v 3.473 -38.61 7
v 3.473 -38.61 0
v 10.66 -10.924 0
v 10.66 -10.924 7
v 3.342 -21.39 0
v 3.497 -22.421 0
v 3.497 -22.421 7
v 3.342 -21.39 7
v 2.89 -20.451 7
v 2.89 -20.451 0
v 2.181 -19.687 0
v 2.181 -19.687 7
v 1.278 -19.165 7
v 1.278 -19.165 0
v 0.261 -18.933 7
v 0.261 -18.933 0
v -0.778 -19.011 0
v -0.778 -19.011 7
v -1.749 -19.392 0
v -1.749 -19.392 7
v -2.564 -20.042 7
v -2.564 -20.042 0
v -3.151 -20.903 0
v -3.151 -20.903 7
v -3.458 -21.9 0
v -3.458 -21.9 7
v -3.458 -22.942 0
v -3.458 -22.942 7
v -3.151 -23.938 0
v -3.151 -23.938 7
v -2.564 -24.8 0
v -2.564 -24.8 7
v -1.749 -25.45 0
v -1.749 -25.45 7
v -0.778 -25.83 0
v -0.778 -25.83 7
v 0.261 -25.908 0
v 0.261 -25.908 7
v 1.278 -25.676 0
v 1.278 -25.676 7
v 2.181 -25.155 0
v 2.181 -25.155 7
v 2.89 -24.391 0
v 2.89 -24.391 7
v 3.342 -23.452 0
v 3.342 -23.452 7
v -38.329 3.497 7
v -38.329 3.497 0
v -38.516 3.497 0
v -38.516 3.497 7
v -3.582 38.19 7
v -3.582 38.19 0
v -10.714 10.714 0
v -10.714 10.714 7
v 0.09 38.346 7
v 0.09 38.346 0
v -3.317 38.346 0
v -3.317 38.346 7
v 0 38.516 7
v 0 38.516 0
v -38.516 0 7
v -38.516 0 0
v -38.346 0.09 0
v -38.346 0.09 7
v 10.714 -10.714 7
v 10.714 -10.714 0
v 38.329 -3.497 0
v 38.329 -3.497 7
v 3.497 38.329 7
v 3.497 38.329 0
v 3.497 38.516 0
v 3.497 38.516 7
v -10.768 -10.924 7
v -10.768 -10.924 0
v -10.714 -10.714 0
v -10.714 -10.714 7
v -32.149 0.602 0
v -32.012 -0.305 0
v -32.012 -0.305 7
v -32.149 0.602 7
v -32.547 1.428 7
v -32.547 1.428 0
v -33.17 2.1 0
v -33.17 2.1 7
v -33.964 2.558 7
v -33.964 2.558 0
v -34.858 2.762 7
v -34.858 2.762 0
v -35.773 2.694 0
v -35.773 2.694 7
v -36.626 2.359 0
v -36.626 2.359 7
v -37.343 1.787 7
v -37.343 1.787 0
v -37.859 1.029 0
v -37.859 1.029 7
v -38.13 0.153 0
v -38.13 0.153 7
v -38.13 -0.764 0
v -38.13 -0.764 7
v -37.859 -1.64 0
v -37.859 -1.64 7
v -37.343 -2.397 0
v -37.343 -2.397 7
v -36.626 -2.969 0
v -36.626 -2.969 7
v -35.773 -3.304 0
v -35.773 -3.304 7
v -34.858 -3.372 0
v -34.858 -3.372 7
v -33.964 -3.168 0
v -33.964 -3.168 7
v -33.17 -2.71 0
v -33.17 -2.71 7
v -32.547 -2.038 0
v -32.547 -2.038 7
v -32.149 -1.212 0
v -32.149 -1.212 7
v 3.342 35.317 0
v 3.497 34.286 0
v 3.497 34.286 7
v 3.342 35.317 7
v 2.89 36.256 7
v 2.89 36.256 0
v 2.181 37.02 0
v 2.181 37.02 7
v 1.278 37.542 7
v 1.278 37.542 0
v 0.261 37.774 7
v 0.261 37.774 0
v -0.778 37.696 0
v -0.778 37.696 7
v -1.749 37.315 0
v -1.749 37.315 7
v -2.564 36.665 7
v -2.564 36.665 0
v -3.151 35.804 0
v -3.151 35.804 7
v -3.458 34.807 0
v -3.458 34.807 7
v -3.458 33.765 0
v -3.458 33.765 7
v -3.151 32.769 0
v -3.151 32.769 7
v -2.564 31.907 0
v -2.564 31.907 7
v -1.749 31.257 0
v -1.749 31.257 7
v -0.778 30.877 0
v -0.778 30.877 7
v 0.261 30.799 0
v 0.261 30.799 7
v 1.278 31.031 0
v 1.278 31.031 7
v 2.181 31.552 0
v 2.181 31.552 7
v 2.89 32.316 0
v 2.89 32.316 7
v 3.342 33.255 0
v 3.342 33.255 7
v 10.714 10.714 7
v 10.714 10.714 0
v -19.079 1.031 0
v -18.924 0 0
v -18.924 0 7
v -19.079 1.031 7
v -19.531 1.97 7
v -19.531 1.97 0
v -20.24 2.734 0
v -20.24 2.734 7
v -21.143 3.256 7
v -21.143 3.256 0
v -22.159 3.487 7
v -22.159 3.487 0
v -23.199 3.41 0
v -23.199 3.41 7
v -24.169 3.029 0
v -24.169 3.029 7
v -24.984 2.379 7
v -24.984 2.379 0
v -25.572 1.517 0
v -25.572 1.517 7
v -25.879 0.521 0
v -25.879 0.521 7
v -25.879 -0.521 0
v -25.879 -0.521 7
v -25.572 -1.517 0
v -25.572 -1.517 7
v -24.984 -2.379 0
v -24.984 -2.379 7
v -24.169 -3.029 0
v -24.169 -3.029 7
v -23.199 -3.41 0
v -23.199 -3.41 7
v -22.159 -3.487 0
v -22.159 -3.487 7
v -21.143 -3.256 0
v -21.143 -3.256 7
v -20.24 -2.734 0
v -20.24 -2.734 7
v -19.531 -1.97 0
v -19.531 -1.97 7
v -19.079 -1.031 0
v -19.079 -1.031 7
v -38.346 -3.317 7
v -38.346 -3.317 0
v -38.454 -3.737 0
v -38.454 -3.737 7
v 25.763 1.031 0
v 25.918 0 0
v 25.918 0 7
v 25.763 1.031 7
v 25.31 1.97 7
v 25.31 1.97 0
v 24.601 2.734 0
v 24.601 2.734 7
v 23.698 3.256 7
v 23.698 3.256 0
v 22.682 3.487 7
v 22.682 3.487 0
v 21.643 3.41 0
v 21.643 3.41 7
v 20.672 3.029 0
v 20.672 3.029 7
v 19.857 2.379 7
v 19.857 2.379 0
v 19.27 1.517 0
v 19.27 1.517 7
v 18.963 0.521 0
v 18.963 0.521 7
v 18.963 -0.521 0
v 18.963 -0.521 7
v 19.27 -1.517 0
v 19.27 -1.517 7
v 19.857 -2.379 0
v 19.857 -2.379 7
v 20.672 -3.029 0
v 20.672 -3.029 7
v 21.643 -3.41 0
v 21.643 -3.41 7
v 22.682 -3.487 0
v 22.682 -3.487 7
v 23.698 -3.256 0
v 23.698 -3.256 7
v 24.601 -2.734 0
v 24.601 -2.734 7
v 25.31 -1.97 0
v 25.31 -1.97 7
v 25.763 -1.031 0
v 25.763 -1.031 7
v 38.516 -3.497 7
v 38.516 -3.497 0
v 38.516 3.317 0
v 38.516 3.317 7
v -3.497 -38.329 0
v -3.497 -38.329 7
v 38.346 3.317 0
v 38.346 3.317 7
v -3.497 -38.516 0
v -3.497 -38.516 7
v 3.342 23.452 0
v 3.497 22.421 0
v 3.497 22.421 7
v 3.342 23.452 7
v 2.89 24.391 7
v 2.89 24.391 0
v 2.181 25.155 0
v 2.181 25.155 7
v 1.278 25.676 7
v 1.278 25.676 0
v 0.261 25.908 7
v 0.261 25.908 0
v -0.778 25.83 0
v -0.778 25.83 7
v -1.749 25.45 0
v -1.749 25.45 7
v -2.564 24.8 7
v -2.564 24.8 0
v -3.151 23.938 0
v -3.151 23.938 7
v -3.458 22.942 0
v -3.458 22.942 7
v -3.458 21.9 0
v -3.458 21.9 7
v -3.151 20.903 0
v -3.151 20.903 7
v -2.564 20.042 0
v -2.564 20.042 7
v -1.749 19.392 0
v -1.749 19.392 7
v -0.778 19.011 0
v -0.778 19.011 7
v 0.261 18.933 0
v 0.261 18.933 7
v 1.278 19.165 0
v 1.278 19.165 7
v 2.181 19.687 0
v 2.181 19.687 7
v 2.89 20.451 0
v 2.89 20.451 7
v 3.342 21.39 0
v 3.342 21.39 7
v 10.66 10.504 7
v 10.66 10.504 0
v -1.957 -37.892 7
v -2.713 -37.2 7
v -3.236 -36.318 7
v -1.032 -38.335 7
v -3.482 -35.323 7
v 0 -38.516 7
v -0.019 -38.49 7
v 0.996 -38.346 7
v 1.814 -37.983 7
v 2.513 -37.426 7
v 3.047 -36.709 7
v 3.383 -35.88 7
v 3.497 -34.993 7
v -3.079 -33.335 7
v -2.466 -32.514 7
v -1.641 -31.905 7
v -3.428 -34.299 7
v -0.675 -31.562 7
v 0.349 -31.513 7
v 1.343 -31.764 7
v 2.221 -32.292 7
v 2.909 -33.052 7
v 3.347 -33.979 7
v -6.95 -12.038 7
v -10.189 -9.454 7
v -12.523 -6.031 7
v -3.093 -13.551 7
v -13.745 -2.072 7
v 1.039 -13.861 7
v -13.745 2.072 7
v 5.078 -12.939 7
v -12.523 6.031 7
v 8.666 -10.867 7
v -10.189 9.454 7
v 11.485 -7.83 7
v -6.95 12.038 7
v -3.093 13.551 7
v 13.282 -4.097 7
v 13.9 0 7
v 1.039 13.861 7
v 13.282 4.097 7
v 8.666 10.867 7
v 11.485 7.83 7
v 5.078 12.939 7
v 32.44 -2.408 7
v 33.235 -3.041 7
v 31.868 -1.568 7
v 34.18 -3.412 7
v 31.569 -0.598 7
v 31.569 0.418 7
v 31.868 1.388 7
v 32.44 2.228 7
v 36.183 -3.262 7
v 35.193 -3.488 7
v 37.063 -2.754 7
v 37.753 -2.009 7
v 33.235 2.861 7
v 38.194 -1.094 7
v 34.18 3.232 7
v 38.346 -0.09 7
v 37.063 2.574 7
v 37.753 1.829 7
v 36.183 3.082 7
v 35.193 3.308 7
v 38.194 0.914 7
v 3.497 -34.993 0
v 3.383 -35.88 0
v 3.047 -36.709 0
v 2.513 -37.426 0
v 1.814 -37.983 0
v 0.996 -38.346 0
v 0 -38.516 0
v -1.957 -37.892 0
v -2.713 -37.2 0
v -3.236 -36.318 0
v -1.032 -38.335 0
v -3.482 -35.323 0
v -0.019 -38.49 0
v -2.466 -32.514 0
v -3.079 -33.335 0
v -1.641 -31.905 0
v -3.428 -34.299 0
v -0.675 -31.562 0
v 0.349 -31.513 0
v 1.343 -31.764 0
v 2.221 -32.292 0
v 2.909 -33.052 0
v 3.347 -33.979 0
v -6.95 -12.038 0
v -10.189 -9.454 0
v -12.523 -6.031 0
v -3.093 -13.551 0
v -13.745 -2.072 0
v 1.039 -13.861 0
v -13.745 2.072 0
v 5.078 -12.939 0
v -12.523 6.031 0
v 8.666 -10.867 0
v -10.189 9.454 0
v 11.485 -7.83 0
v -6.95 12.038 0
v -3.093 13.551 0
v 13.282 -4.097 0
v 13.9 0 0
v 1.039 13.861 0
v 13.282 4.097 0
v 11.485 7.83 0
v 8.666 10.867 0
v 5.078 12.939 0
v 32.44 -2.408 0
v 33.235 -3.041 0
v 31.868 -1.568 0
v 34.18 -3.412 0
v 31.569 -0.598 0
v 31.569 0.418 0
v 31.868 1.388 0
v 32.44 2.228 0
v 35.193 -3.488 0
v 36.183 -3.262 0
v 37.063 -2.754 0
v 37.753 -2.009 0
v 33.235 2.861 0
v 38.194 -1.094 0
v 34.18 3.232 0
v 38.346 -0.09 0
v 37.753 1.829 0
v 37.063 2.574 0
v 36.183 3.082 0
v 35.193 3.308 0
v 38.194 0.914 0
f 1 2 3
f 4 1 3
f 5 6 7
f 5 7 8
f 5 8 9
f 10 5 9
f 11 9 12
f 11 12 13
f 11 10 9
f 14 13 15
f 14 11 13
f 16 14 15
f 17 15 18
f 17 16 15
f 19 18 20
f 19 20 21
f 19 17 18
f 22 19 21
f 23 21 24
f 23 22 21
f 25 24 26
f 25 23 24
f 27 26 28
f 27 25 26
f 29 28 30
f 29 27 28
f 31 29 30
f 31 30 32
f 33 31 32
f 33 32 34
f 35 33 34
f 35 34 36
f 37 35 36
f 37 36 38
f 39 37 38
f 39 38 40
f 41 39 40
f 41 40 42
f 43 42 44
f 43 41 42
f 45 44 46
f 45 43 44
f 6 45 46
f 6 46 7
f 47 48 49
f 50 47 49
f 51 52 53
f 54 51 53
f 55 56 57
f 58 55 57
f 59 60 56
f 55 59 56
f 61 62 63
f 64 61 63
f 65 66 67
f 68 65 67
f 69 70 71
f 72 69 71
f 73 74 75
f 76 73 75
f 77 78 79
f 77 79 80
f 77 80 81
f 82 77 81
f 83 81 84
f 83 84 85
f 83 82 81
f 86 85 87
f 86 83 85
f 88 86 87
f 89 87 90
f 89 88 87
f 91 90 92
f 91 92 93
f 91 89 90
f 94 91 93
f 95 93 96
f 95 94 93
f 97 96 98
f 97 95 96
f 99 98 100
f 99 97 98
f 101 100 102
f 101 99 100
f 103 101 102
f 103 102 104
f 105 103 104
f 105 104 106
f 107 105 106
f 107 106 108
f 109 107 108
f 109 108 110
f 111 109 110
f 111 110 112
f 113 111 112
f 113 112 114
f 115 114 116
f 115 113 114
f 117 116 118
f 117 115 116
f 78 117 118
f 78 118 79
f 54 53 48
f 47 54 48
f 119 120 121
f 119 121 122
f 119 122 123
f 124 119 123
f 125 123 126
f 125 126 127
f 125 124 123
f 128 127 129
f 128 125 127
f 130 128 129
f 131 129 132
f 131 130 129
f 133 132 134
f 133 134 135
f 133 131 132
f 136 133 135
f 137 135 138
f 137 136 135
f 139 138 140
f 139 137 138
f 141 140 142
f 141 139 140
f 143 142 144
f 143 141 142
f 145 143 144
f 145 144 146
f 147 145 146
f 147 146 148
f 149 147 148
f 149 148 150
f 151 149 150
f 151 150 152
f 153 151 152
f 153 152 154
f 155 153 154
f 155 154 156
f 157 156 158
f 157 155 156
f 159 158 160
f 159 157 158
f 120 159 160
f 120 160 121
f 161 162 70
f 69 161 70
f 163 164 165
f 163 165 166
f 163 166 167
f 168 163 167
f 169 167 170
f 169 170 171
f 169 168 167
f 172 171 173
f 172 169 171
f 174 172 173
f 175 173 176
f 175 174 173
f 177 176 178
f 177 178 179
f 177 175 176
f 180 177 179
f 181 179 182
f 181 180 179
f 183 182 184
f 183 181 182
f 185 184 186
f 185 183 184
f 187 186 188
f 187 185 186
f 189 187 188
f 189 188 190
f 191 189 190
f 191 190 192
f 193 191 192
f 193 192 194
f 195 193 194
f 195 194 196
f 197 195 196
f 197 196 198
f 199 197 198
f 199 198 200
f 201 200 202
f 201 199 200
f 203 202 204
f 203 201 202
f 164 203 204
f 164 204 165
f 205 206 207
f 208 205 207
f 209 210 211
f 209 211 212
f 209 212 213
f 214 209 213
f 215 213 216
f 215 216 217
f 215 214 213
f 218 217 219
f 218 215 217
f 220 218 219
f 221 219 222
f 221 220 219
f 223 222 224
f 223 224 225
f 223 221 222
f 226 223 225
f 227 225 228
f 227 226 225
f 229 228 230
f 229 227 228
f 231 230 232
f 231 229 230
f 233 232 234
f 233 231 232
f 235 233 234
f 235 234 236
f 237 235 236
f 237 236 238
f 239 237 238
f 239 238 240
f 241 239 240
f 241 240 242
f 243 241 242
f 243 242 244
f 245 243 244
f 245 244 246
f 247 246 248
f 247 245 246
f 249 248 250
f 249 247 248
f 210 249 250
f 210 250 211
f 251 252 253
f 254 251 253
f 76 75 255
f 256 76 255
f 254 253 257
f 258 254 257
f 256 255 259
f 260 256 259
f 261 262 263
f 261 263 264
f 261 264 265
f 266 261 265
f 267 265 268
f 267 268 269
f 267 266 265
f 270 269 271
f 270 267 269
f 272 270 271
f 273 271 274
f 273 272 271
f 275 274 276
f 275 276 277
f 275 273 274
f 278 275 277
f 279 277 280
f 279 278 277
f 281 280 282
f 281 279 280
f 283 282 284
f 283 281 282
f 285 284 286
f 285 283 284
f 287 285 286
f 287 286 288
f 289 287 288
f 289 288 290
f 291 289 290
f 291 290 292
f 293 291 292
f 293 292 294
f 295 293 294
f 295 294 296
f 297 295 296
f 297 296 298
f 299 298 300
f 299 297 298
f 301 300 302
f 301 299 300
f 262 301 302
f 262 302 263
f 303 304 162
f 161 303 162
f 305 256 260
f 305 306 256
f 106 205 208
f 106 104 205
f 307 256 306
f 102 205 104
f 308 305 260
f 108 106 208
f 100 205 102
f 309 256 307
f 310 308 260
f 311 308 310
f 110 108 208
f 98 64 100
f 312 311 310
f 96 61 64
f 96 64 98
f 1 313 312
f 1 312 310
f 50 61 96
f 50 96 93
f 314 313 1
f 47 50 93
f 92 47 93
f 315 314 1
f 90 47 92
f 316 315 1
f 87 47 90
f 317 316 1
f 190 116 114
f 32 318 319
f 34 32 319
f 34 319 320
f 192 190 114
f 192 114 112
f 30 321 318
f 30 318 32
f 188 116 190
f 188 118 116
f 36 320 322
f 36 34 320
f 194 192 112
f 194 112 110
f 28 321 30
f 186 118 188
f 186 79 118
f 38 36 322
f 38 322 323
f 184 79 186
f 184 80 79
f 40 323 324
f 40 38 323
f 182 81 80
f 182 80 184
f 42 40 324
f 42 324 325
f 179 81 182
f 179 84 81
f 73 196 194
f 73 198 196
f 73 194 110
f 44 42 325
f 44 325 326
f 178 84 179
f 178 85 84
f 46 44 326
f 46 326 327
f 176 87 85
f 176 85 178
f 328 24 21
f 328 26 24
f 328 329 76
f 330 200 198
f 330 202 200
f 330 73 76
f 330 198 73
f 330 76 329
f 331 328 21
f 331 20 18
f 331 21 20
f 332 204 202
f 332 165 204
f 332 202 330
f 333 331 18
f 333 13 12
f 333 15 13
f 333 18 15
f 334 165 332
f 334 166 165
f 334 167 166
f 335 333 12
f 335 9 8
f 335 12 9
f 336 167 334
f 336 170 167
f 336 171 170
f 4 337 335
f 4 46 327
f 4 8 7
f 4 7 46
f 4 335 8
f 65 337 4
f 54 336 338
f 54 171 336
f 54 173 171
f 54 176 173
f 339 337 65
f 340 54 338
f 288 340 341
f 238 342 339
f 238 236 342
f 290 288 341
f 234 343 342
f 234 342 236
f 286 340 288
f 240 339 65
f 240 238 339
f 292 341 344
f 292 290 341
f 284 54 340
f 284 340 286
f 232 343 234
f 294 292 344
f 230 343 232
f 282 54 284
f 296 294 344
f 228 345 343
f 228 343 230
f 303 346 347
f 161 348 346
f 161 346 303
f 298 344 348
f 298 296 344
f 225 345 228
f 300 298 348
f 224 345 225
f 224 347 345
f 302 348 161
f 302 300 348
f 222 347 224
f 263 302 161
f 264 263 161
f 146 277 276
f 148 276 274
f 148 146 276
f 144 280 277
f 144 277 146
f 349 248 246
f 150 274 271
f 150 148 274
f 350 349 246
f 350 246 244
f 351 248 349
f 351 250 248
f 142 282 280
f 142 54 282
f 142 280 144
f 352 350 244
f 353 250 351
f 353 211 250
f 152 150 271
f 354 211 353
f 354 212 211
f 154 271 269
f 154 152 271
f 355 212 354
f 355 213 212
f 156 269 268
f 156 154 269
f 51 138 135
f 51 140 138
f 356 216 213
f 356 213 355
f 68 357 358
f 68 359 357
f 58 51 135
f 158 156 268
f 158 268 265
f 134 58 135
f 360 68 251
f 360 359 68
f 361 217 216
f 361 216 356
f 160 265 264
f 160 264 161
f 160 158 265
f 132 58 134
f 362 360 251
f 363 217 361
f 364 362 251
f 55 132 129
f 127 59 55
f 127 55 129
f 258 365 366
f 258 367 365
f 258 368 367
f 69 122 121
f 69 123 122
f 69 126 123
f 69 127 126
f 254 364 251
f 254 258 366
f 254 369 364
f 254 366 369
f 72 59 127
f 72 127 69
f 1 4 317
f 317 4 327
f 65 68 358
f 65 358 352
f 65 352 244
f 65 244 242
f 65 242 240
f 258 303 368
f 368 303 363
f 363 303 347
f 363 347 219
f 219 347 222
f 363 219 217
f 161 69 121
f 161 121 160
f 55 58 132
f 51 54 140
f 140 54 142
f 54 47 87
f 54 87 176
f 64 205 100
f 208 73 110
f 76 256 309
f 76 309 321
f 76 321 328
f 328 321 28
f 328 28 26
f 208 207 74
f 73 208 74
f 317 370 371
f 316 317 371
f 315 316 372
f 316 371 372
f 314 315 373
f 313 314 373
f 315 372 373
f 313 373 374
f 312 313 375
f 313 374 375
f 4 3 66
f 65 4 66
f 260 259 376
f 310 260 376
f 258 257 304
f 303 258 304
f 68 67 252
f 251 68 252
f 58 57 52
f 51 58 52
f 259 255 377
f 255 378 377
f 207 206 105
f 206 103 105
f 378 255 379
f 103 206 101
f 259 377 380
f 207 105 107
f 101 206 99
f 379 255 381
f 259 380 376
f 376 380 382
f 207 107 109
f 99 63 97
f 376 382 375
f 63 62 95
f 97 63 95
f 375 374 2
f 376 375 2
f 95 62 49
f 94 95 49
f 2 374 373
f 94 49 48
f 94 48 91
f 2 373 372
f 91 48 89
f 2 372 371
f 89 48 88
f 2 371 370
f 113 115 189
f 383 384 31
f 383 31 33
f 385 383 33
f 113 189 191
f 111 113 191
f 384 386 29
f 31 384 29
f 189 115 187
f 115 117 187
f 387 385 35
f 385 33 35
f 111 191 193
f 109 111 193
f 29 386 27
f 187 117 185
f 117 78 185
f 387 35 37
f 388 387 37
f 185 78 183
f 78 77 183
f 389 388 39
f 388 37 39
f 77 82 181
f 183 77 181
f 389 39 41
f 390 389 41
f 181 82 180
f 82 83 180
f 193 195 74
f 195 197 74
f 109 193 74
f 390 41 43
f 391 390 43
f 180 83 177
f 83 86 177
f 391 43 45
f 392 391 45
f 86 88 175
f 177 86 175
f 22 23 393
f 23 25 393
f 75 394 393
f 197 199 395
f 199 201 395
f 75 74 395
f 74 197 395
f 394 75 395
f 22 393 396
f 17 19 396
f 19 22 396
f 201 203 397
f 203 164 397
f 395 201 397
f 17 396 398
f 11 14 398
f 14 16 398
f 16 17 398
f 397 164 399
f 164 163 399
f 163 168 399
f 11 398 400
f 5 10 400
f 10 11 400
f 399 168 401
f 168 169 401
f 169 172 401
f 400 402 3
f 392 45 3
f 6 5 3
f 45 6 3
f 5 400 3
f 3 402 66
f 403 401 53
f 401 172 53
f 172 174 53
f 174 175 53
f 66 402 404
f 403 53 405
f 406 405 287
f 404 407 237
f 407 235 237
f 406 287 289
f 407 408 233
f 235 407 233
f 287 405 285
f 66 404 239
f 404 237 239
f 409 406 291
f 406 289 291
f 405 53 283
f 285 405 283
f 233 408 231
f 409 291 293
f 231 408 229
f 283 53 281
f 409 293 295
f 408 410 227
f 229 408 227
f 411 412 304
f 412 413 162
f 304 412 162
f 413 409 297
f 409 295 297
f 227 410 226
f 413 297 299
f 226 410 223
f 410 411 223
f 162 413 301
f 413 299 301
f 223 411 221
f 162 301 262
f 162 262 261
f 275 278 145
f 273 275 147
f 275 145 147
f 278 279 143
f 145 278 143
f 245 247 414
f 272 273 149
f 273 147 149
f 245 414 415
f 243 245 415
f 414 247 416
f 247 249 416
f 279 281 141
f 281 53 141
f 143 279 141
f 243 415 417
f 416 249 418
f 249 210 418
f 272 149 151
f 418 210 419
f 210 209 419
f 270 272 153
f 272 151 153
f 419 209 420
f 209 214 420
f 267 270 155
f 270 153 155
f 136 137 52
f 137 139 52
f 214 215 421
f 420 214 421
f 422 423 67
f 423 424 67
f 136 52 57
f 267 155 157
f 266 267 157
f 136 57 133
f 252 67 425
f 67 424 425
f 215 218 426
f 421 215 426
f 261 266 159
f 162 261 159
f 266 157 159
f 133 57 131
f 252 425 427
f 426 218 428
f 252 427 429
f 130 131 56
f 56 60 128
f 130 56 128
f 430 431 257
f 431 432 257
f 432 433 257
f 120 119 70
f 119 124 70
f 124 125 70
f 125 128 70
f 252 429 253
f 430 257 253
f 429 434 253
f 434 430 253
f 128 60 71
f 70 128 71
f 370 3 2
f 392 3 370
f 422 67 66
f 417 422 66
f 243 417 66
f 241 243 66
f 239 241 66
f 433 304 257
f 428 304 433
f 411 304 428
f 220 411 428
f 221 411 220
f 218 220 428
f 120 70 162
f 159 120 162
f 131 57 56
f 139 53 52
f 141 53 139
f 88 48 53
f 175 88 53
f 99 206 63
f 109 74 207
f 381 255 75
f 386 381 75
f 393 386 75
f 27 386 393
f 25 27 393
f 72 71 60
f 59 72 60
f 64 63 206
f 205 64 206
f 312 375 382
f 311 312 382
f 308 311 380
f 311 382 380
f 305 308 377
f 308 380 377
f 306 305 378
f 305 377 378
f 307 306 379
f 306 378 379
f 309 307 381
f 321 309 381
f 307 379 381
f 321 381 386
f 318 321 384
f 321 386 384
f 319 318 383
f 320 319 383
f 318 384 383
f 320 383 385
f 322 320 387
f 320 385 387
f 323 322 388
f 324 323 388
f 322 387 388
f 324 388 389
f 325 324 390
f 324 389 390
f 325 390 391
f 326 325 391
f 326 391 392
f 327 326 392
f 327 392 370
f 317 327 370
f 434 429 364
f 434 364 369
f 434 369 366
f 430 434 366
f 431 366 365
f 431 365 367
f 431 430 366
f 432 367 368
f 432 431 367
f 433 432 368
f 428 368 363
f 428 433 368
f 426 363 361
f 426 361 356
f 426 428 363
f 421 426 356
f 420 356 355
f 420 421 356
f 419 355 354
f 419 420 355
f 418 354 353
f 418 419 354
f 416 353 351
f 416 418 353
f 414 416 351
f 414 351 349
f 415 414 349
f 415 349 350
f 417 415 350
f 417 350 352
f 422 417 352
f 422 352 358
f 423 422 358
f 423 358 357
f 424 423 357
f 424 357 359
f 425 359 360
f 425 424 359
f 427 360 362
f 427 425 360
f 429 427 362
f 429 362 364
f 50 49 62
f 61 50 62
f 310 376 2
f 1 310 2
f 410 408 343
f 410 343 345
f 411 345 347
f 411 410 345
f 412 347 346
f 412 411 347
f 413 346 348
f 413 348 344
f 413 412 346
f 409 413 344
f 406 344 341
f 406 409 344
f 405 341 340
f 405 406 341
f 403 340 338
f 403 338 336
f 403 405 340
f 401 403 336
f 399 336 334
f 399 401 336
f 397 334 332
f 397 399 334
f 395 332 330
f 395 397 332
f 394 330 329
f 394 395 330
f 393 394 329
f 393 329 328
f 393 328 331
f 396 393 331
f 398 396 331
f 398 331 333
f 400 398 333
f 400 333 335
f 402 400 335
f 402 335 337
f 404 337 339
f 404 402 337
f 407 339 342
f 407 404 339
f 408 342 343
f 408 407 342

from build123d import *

# Parameters (mm, degrees)
F0_R     = 3.075923
F0_R_2   = 3.497253
F0_R_3   = 3.40731
F0_R_4   = 13.899926
F0_R_5   = 3.497252
F1_DEPTH = 7


with BuildPart() as f1:
    # F0 (on Top) → F1 (new body)
    with BuildSketch(Plane.XY):
        with BuildLine():
            ThreePointArc((0.996115, -38.345504), (2.803066, -37.084421), (3.497242, -34.993124))
            ThreePointArc((3.497242, -34.993124), (-2.803066, -32.901827), (0.996115, -38.345504))
        make_face()
        Polygon((0, -38.515605), (3.472779, -38.609888), (10.659512, -10.923896), (10.713998, -10.713998), (38.329154, -3.497253), (38.515605, -3.497253), (38.515605, 0), (38.515605, 3.317366), (38.345504, 3.317366), (10.659512, 10.5041), (10.713998, 10.713998), (3.497253, 38.329154), (3.497253, 38.515605), (0, 38.515605), (0.089943, 38.345504), (-3.317366, 38.345504), (-3.58175, 38.190092), (-10.713998, 10.713998), (-38.329154, 3.497253), (-38.515605, 3.497253), (-38.515605, 0), (-38.345504, 0.089943), (-38.345504, -3.317366), (-38.454475, -3.737162), (-10.768483, -10.923896), (-10.713998, -10.713998), (-3.497253, -38.329154), (-3.497253, -38.515605), align=None)
        with Locations((-35.088168, -0.30512)):
            Circle(F0_R, mode=Mode.SUBTRACT)
        with BuildLine():
            ThreePointArc((0.996115, -38.345504), (-2.803066, -32.901827), (3.497242, -34.993124))
            ThreePointArc((3.497242, -34.993124), (2.803066, -37.084421), (0.996115, -38.345504))
        make_face(mode=Mode.SUBTRACT)
        with Locations((0, -22.420802)):
            Circle(F0_R_2, mode=Mode.SUBTRACT)
        with Locations((34.938195, -0.089943)):
            Circle(F0_R_3, mode=Mode.SUBTRACT)
        with Locations((-22.420802, 0)):
            Circle(F0_R_2, mode=Mode.SUBTRACT)
        Circle(F0_R_4, mode=Mode.SUBTRACT)
        with Locations((22.420802, 0)):
            Circle(F0_R_2, mode=Mode.SUBTRACT)
        with Locations((0, 22.420802)):
            Circle(F0_R_2, mode=Mode.SUBTRACT)
        with Locations((0, 34.286165)):
            Circle(F0_R_5, mode=Mode.SUBTRACT)
    extrude(amount=F1_DEPTH)


solid = f1.part
